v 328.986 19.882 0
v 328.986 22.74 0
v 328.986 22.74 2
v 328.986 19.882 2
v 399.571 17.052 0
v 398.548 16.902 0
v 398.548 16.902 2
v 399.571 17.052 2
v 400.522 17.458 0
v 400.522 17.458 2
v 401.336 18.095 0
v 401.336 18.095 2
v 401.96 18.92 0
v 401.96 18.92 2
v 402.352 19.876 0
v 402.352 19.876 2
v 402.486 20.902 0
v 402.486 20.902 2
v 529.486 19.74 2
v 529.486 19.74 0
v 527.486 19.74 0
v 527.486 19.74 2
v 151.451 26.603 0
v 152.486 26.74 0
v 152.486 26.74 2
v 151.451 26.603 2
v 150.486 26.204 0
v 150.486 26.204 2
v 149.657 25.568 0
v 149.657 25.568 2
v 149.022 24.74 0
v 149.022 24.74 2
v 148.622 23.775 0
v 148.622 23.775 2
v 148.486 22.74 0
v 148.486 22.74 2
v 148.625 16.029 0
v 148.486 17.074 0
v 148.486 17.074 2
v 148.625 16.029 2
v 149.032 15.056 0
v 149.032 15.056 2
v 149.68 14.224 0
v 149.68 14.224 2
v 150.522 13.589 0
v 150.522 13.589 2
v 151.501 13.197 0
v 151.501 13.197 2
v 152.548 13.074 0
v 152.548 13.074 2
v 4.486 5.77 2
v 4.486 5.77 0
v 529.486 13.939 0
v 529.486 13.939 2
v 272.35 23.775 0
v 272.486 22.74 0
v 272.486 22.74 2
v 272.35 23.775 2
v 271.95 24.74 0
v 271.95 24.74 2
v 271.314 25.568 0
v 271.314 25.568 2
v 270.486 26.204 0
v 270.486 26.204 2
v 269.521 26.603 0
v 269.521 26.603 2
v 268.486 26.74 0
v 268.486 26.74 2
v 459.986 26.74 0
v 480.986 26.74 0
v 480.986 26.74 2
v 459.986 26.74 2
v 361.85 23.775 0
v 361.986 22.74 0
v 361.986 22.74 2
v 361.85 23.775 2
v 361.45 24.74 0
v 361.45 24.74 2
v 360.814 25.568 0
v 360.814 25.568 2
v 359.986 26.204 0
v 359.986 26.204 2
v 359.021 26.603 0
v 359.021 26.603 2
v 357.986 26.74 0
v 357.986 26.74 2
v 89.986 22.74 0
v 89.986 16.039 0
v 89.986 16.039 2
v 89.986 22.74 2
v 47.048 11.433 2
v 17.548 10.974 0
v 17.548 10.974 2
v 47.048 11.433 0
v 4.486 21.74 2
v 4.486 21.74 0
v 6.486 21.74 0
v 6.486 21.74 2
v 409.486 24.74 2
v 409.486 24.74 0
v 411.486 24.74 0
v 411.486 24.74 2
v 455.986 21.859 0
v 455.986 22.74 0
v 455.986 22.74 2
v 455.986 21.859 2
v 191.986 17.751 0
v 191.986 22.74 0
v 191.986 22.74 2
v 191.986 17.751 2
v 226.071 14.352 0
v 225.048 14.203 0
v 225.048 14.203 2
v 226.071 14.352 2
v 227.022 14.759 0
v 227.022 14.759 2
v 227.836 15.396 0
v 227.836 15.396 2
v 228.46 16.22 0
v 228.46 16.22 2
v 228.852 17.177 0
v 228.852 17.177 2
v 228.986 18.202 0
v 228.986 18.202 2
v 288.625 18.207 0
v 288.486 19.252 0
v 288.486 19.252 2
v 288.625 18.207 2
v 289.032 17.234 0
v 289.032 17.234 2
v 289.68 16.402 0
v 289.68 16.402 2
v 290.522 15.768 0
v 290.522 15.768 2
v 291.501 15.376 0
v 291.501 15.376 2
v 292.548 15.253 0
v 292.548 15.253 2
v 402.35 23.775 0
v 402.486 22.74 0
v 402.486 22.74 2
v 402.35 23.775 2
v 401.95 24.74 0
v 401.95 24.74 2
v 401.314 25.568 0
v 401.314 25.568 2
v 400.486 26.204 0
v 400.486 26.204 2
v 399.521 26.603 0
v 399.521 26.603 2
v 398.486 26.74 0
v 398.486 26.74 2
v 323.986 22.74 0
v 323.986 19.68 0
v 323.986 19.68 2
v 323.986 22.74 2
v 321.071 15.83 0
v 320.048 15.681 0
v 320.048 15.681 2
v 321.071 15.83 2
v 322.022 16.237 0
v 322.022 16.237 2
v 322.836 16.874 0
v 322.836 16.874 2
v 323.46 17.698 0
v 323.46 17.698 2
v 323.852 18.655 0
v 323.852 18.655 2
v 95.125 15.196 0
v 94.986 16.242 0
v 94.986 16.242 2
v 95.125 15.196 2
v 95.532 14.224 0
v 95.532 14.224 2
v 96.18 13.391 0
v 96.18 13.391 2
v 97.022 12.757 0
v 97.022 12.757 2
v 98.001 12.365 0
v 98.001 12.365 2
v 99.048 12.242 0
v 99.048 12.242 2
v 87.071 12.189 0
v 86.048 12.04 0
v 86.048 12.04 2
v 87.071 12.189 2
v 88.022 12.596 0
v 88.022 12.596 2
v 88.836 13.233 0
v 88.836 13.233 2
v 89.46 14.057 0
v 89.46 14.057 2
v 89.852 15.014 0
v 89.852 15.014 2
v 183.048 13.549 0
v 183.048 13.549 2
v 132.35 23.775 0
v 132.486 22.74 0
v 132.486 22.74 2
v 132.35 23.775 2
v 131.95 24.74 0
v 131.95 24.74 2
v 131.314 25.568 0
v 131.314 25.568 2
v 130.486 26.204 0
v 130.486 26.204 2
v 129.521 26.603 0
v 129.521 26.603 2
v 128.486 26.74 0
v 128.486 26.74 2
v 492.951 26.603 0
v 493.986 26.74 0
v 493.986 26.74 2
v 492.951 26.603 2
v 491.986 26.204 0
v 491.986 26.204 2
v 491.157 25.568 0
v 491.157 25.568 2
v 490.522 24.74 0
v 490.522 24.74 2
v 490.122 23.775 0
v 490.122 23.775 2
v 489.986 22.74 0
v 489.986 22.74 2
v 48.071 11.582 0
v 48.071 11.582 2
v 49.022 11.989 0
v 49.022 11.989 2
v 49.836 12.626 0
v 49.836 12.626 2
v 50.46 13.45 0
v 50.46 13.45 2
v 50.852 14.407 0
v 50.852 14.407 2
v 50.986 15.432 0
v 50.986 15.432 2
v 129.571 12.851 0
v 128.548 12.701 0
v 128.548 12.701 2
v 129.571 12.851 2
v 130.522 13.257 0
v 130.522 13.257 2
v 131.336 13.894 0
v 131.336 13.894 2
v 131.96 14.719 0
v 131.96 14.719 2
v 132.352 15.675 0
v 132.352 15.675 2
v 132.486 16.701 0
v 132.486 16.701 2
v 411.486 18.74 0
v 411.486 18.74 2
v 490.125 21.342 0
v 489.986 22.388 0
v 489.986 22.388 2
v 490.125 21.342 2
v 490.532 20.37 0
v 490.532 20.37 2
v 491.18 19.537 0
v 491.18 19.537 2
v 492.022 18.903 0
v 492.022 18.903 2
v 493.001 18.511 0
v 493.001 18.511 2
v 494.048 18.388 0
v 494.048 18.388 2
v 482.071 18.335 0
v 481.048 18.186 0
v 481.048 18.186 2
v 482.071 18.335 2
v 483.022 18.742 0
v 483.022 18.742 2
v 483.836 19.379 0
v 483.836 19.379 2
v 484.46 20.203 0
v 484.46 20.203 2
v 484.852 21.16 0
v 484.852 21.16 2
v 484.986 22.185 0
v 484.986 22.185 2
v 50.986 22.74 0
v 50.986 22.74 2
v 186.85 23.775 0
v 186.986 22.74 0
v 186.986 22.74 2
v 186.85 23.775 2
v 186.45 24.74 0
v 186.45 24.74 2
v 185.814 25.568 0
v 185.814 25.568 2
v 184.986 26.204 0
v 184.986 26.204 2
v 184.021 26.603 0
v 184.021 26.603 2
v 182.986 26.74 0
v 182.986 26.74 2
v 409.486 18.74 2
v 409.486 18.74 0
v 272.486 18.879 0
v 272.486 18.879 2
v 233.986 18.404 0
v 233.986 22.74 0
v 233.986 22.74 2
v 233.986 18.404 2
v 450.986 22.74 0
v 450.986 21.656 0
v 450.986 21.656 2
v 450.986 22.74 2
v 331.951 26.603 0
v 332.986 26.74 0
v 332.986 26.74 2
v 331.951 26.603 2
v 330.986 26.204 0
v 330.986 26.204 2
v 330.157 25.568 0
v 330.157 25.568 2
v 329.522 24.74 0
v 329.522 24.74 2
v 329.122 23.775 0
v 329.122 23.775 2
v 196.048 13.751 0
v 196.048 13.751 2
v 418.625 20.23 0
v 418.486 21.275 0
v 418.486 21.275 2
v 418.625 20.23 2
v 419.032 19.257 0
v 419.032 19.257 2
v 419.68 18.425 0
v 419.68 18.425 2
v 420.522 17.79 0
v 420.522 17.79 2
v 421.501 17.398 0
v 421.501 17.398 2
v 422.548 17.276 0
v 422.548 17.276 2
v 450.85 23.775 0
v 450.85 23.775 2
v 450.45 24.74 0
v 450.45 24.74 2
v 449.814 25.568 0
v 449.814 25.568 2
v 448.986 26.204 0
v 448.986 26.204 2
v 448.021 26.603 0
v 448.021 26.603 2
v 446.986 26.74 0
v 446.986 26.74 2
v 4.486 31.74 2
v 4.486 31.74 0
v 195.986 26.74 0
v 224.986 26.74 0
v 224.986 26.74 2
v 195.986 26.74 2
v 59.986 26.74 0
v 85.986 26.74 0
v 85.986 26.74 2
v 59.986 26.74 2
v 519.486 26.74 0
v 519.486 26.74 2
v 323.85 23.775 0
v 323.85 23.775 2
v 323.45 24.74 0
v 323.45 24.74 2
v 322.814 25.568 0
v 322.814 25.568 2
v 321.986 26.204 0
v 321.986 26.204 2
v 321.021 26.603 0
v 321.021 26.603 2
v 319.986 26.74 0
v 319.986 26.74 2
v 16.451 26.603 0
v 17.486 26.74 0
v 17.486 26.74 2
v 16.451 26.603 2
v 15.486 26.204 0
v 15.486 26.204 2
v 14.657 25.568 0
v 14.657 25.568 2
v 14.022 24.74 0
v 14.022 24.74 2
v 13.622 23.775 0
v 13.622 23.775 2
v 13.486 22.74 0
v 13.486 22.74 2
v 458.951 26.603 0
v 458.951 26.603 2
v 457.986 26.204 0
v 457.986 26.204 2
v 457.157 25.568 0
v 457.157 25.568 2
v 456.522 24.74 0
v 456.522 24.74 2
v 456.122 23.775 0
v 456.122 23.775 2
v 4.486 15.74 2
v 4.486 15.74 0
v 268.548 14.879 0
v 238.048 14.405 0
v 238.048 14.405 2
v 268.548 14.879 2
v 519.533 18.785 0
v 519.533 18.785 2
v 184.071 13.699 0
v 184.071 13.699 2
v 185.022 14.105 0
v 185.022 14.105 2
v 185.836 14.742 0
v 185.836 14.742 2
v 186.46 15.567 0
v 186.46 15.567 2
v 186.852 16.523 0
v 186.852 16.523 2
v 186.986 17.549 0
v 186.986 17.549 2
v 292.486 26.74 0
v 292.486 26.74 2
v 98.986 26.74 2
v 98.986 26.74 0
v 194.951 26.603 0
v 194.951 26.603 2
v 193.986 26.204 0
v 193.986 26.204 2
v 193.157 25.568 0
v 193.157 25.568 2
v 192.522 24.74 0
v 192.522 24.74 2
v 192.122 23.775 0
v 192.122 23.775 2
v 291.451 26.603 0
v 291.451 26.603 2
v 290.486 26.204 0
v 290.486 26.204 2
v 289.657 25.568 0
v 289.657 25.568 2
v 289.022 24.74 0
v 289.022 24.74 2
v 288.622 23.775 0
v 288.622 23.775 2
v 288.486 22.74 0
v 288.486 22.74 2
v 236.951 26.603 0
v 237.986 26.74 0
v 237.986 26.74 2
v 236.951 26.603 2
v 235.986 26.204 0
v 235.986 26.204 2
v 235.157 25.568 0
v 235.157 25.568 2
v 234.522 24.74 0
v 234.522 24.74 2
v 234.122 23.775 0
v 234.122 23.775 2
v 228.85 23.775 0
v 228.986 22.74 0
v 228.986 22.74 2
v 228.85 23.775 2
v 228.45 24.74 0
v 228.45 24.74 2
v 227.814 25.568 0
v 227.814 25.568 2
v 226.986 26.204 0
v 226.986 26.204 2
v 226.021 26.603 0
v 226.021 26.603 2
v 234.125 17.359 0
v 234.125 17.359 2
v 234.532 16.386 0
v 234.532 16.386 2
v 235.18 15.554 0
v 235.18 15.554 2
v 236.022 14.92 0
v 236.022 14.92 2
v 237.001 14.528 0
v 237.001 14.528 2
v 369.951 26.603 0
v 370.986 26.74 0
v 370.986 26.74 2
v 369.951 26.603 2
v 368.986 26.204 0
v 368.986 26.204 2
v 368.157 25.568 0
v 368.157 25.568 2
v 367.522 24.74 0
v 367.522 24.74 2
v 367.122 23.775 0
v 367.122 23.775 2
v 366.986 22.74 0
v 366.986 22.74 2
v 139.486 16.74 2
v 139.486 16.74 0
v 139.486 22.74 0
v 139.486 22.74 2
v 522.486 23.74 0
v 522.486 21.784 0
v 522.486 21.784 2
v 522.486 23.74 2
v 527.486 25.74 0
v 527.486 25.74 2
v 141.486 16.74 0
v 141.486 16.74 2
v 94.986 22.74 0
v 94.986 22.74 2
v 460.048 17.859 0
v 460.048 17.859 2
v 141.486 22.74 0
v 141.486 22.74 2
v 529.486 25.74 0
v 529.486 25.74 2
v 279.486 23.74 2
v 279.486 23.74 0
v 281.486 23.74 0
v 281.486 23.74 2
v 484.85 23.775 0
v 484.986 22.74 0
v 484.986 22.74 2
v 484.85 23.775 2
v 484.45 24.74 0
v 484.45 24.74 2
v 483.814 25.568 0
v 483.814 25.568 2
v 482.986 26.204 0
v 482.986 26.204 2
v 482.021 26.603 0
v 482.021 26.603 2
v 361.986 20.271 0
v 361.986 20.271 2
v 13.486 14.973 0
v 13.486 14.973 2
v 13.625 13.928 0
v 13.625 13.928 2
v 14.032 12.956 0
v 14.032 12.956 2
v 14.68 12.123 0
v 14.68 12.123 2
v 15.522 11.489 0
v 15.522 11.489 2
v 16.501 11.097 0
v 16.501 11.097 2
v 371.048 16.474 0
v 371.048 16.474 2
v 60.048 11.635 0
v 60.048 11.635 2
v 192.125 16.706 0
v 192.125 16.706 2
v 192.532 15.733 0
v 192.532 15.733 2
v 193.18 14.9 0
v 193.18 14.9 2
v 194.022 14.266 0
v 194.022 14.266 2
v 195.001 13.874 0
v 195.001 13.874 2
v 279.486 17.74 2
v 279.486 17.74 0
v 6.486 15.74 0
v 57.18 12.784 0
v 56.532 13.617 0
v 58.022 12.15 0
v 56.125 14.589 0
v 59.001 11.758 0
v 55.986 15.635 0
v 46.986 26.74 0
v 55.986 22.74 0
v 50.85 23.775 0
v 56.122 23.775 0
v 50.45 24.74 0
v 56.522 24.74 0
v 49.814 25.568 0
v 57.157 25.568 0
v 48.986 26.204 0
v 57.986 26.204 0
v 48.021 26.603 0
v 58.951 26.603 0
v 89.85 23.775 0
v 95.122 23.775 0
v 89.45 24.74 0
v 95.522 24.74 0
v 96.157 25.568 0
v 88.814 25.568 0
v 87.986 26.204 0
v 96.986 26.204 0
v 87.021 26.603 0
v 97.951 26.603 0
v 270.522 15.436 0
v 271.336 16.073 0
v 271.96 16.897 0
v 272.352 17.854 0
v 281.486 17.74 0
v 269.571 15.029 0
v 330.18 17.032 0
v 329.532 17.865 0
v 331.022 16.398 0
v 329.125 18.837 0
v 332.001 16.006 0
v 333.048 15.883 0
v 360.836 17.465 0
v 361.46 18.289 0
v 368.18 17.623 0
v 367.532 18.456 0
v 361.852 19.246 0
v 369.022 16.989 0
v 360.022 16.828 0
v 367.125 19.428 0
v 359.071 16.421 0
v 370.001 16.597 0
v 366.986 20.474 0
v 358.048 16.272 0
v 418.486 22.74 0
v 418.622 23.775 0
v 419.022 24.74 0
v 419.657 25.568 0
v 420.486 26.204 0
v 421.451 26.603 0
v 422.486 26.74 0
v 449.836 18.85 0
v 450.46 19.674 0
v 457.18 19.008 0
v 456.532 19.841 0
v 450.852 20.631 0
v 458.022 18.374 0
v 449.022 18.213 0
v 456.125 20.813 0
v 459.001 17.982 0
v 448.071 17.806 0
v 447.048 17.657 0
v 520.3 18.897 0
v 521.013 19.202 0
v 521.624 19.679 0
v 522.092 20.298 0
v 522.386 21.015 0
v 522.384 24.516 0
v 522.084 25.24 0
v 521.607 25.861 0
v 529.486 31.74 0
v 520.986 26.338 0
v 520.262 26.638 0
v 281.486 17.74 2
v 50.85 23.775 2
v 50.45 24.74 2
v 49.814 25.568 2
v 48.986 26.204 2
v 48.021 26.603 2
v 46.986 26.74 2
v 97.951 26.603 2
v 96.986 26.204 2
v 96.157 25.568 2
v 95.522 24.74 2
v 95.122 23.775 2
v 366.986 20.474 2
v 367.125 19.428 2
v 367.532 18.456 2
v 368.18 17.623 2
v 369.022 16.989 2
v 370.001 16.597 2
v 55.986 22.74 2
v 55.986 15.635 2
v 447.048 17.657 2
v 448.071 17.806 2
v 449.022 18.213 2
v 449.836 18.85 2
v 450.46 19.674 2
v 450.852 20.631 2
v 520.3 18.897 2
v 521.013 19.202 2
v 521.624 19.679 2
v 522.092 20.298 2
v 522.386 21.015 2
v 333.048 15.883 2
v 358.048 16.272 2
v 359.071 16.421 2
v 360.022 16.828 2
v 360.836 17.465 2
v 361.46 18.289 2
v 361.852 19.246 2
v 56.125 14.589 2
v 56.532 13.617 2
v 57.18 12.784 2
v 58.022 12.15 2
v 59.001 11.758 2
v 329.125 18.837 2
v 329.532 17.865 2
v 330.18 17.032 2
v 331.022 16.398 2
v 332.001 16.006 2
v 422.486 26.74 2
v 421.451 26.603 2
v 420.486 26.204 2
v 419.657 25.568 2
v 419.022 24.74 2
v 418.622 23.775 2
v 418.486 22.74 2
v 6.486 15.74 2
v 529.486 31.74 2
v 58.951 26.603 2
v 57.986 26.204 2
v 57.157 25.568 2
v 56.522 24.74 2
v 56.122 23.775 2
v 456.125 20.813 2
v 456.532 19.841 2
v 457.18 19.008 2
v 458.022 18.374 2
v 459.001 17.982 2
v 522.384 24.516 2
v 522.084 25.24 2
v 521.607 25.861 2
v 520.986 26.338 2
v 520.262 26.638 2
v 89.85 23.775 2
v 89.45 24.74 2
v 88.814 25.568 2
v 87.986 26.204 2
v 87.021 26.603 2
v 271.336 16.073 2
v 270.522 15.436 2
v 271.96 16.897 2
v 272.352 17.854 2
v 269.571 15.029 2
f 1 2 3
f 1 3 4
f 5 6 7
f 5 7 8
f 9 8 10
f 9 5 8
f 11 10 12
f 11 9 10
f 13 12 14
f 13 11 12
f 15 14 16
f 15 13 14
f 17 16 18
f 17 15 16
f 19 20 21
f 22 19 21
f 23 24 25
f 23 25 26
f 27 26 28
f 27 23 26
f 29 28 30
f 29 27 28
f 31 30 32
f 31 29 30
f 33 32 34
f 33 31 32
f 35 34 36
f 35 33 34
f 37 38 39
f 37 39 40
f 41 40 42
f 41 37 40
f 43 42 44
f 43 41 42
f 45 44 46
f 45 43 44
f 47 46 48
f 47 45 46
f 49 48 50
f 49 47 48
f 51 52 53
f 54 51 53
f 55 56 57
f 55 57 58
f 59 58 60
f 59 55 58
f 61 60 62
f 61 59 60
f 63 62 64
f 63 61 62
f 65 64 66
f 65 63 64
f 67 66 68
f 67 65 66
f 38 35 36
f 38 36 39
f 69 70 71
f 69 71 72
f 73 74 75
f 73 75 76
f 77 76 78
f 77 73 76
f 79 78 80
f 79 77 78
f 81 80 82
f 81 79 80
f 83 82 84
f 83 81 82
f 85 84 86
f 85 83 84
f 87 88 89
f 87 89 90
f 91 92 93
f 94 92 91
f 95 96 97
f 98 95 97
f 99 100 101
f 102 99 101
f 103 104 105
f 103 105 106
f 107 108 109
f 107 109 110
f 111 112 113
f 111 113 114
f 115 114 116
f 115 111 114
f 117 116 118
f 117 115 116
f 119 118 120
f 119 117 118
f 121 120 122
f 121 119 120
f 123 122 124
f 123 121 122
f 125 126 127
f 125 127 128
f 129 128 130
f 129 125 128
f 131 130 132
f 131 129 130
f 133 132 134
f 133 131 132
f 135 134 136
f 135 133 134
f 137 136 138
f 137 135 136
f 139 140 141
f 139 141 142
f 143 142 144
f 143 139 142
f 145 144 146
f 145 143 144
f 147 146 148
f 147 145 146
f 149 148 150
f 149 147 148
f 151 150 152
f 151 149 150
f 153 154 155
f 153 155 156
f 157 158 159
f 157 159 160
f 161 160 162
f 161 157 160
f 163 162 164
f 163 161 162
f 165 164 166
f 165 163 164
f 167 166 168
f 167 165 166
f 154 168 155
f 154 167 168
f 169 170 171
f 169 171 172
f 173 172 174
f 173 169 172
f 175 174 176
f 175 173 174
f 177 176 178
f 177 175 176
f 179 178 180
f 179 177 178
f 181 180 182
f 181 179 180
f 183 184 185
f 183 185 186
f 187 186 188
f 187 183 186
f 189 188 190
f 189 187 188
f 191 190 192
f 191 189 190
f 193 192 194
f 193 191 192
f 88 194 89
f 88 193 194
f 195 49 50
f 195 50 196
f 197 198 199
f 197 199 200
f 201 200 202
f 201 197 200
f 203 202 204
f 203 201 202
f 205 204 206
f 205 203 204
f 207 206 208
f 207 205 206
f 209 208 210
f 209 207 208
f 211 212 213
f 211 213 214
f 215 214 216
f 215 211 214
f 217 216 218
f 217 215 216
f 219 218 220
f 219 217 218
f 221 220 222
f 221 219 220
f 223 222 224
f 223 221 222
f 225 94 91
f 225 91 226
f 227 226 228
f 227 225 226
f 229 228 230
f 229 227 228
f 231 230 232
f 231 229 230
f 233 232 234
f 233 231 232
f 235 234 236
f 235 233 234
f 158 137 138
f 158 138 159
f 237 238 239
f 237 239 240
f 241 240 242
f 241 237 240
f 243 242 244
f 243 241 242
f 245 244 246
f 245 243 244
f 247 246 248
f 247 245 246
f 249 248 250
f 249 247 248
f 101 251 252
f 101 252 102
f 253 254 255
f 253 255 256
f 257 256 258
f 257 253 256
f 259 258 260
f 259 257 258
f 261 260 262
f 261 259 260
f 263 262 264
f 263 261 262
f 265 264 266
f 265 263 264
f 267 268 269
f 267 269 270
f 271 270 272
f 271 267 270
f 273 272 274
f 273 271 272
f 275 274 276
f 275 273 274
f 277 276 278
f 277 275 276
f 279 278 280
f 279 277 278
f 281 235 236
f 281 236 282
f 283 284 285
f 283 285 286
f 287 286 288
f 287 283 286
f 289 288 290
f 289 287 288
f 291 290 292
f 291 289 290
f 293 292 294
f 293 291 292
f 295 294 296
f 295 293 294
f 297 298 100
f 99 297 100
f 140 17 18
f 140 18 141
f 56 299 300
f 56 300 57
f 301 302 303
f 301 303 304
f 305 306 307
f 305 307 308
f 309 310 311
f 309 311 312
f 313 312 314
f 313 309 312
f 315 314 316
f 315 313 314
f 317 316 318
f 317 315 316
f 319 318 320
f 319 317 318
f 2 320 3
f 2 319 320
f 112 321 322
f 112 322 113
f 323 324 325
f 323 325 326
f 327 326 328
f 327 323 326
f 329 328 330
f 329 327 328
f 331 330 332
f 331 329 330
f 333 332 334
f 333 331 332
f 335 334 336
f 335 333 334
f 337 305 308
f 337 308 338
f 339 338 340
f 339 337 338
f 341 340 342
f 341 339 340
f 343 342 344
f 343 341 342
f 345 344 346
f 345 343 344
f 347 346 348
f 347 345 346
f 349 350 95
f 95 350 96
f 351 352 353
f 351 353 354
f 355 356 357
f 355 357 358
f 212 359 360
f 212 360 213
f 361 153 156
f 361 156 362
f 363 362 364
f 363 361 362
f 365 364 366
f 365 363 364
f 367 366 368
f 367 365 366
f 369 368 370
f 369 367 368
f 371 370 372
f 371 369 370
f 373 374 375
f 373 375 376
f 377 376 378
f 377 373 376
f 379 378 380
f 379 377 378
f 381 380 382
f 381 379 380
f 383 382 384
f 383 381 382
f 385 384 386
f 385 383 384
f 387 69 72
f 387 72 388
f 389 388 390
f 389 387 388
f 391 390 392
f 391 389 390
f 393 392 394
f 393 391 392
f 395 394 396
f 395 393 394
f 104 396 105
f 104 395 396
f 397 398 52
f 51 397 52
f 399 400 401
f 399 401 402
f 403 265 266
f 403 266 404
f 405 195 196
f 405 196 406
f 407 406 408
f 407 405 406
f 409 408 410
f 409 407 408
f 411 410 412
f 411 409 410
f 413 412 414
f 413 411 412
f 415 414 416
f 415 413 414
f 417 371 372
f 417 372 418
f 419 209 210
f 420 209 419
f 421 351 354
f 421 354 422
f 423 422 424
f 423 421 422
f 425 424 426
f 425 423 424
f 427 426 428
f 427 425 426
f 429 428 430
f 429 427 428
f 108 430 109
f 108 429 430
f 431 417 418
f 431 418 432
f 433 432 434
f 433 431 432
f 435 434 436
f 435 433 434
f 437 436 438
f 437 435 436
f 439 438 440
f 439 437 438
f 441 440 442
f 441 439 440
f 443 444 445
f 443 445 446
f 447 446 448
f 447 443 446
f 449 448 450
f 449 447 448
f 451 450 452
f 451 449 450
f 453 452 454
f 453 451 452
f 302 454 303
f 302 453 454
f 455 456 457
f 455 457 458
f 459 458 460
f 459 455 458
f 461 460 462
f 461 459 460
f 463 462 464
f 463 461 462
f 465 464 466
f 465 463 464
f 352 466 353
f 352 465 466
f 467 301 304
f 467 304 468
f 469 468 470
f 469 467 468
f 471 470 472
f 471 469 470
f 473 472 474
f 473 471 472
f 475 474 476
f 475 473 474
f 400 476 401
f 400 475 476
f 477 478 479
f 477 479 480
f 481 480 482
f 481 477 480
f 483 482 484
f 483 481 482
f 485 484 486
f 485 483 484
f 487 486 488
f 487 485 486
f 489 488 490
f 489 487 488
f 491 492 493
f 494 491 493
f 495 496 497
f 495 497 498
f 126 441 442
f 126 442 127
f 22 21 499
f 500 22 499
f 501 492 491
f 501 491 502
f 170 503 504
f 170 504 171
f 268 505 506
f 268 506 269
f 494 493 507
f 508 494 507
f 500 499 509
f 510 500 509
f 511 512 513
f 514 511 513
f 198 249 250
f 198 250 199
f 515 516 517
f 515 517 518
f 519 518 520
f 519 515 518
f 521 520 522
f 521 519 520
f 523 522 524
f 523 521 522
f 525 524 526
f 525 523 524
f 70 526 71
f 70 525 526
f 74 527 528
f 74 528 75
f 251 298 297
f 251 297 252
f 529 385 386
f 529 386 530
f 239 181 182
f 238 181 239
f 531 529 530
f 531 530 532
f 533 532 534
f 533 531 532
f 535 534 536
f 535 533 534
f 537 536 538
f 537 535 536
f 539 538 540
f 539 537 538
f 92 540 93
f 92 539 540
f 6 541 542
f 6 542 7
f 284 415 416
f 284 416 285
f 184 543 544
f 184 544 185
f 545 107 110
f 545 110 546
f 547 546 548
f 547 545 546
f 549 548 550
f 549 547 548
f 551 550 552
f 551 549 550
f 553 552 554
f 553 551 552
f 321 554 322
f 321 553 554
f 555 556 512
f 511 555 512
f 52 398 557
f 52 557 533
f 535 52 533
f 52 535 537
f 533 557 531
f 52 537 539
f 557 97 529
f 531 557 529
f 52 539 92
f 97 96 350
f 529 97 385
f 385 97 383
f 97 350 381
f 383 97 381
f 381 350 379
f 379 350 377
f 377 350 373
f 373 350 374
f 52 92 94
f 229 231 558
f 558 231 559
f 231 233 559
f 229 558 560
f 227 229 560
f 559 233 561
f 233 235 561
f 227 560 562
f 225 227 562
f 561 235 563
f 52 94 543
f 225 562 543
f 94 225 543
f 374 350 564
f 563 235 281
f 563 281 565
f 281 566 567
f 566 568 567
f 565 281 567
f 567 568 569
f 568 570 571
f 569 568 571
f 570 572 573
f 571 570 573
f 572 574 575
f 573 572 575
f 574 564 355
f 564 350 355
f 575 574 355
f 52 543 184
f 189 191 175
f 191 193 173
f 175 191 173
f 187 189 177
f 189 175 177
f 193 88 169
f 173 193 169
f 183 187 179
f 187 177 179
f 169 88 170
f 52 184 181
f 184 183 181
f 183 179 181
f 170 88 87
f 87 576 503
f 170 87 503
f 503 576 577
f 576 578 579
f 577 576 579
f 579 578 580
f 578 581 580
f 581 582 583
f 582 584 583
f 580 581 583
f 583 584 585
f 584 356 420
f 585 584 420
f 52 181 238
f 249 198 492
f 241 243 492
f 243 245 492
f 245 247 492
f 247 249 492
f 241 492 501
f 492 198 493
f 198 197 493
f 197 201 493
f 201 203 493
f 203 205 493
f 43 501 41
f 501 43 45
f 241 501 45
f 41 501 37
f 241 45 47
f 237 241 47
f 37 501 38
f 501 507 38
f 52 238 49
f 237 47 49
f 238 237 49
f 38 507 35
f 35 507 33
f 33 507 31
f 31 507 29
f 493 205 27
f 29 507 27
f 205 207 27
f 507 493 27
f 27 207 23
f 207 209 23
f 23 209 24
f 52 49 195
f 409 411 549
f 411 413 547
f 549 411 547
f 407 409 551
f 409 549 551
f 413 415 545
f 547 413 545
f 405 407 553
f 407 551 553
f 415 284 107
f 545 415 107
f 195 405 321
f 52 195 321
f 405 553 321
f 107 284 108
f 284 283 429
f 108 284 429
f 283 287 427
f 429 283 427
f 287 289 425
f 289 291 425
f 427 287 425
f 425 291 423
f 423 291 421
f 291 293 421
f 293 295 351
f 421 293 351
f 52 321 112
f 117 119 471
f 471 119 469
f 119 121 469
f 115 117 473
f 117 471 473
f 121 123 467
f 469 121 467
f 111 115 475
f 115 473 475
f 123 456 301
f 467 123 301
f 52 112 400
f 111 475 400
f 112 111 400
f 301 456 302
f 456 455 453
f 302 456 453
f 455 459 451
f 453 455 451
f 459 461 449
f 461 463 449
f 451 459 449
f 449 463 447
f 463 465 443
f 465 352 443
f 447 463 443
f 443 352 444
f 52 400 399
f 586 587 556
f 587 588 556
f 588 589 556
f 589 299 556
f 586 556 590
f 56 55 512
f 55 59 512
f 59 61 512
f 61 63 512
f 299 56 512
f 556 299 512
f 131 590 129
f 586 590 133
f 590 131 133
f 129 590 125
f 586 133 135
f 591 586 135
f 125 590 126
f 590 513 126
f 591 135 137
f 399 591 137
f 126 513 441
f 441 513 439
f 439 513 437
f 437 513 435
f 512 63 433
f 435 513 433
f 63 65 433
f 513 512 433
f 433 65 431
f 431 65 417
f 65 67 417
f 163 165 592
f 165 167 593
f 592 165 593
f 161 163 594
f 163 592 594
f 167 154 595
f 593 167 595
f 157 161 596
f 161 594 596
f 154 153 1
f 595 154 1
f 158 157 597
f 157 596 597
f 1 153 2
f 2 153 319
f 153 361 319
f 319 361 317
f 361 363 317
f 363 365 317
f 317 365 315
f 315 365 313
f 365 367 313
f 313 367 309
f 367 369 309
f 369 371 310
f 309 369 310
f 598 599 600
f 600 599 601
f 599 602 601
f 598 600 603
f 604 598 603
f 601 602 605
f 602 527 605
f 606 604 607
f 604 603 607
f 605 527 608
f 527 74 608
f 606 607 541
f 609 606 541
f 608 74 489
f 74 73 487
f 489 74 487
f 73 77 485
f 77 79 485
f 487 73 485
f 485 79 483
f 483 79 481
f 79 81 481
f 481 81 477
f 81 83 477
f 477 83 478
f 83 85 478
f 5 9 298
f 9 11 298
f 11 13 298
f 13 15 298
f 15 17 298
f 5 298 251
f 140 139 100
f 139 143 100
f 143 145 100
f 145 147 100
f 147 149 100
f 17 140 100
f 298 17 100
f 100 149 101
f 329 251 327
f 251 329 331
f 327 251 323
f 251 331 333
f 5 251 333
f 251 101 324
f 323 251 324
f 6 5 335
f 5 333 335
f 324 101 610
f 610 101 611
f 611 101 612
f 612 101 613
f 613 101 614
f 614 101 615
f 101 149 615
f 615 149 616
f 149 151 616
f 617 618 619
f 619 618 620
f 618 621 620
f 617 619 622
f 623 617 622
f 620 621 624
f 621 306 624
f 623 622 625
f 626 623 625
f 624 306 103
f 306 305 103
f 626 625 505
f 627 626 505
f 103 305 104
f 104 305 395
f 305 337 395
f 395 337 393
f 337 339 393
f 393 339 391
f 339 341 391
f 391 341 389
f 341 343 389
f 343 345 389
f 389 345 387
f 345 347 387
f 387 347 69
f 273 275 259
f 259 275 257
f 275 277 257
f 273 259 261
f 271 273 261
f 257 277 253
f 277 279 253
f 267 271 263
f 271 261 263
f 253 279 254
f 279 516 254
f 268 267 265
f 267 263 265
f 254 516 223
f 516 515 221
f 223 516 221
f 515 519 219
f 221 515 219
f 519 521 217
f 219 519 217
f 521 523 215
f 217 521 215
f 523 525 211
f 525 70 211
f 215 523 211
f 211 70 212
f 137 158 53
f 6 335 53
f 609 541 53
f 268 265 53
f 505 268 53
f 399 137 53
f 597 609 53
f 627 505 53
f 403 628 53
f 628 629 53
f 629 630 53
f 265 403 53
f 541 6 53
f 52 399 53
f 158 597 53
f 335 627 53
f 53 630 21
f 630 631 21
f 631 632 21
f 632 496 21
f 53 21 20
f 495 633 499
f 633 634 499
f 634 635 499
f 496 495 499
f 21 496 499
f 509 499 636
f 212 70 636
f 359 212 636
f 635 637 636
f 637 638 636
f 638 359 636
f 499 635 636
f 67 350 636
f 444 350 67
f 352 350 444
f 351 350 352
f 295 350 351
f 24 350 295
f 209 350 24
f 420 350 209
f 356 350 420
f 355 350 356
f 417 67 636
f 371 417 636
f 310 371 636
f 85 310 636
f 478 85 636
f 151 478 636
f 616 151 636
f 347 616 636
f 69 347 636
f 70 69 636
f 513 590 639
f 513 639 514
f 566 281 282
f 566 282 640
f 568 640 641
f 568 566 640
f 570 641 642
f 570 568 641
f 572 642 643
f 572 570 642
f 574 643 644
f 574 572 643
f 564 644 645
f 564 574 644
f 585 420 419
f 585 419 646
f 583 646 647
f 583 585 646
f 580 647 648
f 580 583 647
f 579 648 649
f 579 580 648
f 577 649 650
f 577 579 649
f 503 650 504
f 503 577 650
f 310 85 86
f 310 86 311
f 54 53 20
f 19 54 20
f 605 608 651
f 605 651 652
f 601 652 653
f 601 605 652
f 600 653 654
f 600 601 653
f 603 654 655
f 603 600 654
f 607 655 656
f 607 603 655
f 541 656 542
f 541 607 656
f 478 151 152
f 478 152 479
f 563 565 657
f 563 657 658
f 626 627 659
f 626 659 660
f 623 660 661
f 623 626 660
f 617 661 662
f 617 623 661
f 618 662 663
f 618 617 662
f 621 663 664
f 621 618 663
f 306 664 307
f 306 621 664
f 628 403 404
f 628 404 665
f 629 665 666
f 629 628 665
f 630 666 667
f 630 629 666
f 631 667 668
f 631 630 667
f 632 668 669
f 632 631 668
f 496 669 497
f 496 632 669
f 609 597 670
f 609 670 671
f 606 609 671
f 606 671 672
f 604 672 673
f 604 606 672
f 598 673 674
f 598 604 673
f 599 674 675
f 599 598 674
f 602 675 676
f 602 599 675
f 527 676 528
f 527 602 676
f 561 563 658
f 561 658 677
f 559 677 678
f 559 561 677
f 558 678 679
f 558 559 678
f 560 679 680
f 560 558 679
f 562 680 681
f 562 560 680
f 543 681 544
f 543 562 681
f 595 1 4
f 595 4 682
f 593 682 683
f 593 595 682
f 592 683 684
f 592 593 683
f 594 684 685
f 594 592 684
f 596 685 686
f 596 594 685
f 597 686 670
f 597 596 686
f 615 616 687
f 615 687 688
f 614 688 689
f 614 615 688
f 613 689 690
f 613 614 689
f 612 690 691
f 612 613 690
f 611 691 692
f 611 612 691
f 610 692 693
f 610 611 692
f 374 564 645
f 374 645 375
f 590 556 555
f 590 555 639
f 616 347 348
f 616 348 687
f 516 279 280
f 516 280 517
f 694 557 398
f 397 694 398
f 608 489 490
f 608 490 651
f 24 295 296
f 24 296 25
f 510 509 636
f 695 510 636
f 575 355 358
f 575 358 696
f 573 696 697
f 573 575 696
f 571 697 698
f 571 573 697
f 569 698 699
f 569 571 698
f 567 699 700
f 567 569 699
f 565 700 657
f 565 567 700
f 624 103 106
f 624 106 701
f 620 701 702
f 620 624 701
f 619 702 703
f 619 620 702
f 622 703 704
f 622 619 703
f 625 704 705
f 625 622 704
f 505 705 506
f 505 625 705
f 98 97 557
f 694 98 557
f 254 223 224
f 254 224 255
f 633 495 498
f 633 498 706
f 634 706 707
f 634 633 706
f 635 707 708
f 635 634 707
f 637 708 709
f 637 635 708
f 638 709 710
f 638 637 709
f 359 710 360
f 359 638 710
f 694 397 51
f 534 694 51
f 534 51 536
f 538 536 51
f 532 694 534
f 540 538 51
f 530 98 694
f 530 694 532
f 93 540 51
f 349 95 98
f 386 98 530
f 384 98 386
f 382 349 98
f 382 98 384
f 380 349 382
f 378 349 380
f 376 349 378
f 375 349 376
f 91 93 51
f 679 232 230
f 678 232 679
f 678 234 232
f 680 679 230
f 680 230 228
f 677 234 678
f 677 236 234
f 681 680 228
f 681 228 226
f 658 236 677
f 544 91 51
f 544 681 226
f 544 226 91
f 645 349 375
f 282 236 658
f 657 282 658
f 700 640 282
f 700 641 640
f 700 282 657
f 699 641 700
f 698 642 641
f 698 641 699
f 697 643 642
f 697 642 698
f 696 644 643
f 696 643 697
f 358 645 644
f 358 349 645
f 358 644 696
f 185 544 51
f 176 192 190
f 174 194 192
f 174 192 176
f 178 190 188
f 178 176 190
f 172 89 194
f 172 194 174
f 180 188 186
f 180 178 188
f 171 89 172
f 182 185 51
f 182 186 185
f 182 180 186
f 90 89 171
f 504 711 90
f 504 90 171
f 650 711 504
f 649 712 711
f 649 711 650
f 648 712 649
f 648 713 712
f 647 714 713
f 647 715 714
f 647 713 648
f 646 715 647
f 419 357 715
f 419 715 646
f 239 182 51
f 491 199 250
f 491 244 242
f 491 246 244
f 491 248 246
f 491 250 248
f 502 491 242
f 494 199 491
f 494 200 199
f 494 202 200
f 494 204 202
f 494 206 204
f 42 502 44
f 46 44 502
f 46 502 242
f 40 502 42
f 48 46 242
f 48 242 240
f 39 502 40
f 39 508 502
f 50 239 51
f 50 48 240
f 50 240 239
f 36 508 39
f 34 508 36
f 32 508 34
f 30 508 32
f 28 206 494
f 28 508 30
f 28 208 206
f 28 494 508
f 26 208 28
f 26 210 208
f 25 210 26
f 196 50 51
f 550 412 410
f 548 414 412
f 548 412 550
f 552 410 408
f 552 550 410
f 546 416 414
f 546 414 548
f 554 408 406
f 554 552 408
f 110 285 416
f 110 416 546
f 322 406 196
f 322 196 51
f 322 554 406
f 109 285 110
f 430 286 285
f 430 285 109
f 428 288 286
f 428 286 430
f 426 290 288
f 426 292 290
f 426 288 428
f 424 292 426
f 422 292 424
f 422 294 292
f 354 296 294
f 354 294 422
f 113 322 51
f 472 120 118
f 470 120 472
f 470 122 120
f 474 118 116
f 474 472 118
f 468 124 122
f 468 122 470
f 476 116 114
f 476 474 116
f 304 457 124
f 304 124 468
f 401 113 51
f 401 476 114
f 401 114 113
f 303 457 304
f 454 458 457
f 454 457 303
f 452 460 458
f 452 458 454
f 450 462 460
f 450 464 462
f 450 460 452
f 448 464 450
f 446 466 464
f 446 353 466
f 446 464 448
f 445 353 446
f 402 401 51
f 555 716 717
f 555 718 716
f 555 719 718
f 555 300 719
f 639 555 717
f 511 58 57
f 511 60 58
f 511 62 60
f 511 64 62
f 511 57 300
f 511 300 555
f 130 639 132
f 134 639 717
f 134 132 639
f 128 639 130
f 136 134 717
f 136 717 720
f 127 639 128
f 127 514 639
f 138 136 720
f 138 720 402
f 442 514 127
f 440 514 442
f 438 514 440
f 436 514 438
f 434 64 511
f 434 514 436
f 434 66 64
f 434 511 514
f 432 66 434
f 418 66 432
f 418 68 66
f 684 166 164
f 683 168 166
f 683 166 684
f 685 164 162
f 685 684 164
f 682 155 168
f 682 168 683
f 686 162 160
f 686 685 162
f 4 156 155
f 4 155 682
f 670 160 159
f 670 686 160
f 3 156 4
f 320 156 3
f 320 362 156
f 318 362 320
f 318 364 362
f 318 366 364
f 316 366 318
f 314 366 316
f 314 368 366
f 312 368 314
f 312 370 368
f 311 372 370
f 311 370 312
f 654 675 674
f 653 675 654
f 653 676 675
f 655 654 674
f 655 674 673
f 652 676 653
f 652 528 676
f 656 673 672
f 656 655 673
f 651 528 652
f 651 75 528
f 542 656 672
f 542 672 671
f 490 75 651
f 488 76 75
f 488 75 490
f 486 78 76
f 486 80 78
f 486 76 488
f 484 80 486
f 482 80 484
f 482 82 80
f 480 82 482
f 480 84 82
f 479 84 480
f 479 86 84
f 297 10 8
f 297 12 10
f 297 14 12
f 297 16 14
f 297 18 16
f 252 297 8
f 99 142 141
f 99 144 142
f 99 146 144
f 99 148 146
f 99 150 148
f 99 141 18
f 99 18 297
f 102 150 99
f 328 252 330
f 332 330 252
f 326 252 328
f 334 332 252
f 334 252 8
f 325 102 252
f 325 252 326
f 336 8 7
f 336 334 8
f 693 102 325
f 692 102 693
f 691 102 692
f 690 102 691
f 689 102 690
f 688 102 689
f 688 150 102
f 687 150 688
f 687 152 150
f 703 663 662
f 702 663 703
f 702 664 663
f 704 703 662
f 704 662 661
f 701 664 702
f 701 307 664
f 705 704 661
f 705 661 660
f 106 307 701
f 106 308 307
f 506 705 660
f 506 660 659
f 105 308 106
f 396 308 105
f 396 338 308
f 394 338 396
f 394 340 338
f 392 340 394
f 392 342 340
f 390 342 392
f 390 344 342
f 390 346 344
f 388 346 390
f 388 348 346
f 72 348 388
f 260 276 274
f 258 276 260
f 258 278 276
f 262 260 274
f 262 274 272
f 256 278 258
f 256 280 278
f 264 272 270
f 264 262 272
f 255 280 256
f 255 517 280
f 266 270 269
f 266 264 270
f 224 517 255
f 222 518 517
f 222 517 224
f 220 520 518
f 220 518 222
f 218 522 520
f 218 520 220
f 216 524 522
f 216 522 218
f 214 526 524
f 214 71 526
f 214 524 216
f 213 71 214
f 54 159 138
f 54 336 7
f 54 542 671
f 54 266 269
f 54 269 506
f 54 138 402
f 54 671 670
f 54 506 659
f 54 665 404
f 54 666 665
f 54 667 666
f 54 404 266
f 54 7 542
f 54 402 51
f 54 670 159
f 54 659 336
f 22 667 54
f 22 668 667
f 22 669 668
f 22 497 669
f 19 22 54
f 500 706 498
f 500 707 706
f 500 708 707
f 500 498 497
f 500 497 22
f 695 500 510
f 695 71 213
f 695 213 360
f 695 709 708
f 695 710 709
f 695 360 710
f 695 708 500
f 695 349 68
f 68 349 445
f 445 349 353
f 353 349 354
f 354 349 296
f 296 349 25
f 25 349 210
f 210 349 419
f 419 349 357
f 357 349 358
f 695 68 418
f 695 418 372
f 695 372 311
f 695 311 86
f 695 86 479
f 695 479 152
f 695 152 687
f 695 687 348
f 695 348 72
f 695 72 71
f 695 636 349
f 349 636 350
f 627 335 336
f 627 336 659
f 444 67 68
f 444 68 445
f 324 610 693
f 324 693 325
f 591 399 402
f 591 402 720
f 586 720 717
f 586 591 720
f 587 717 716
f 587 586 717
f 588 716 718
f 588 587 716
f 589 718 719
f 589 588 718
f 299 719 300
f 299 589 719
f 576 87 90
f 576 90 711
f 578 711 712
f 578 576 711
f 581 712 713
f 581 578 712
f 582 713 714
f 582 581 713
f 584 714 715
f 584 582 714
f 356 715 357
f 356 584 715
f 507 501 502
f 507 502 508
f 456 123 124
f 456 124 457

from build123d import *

# Parameters (mm, degrees)
SKETCH_1_W      = 2
SKETCH_1_H      = 6
EXTRUDE_1_DEPTH = 2


with BuildPart() as part:
    # 草图1 → 凸台-拉伸1 (new body)
    with BuildSketch(Plane.XY):
        Polygon((529.48584496, 31.739769875), (4.48584496, 31.739769875), (4.48584496, 21.739769875), (6.48584496, 21.739769875), (6.48584496, 15.739769875), (4.48584496, 15.739769875), (4.48584496, 5.770075294), (529.48584496, 13.938813064), (529.48584496, 19.739769875), (527.48584496, 19.739769875), (527.48584496, 25.739769875), (529.48584496, 25.739769875), align=None)
        with Locations((140.48584496, 19.739769875)):
            Rectangle(SKETCH_1_W, SKETCH_1_H, mode=Mode.SUBTRACT)
        with Locations((280.48584496, 20.739769875)):
            Rectangle(SKETCH_1_W, SKETCH_1_H, mode=Mode.SUBTRACT)
        with Locations((410.48584496, 21.739769875)):
            Rectangle(SKETCH_1_W, SKETCH_1_H, mode=Mode.SUBTRACT)
        with BuildLine():
            Line((13.48584496, 22.739769875), (13.48584496, 14.973438176))
            ThreePointArc((13.48584496, 14.973438176), (14.679505875, 12.123094173), (17.54807543, 10.973922284))
            Line((17.54807543, 10.973922284), (47.04807543, 11.43292755))
            ThreePointArc((47.04807543, 11.43292755), (49.836188964, 12.626104356), (50.98584496, 15.432443441))
            Line((50.98584496, 15.432443441), (50.98584496, 22.739769875))
            ThreePointArc((50.98584496, 22.739769875), (49.814272085, 25.568196999), (46.98584496, 26.739769875))
            Line((46.98584496, 26.739769875), (17.48584496, 26.739769875))
            ThreePointArc((17.48584496, 26.739769875), (14.657417835, 25.568196999), (13.48584496, 22.739769875))
        make_face(mode=Mode.SUBTRACT)
        with BuildLine():
            Line((55.98584496, 22.739769875), (55.98584496, 15.634716948))
            ThreePointArc((55.98584496, 15.634716948), (57.179505875, 12.784372944), (60.04807543, 11.635201056))
            Line((60.04807543, 11.635201056), (86.04807543, 12.03974807))
            ThreePointArc((86.04807543, 12.03974807), (88.836188964, 13.232924876), (89.98584496, 16.039263961))
            Line((89.98584496, 16.039263961), (89.98584496, 22.739769875))
            ThreePointArc((89.98584496, 22.739769875), (88.814272085, 25.568196999), (85.98584496, 26.739769875))
            Line((85.98584496, 26.739769875), (59.98584496, 26.739769875))
            ThreePointArc((59.98584496, 26.739769875), (57.157417835, 25.568196999), (55.98584496, 22.739769875))
        make_face(mode=Mode.SUBTRACT)
        with BuildLine():
            Line((94.98584496, 22.739769875), (94.98584496, 16.241537468))
            ThreePointArc((94.98584496, 16.241537468), (96.179505875, 13.391193464), (99.04807543, 12.242021576))
            Line((99.04807543, 12.242021576), (128.54807543, 12.701026841))
            ThreePointArc((128.54807543, 12.701026841), (131.336188964, 13.894203648), (132.48584496, 16.700542733))
            Line((132.48584496, 16.700542733), (132.48584496, 22.739769875))
            ThreePointArc((132.48584496, 22.739769875), (131.314272085, 25.568196999), (128.48584496, 26.739769875))
            Line((128.48584496, 26.739769875), (98.98584496, 26.739769875))
            ThreePointArc((98.98584496, 26.739769875), (96.157417835, 25.568196999), (94.98584496, 22.739769875))
        make_face(mode=Mode.SUBTRACT)
        with BuildLine():
            Line((148.48584496, 22.739769875), (148.48584496, 17.073970745))
            ThreePointArc((148.48584496, 17.073970745), (149.679505875, 14.223626742), (152.54807543, 13.074454854))
            Line((152.54807543, 13.074454854), (183.04807543, 13.549019619))
            ThreePointArc((183.04807543, 13.549019619), (185.836188964, 14.742196426), (186.98584496, 17.548535511))
            Line((186.98584496, 17.548535511), (186.98584496, 22.739769875))
            ThreePointArc((186.98584496, 22.739769875), (185.814272085, 25.568196999), (182.98584496, 26.739769875))
            Line((182.98584496, 26.739769875), (152.48584496, 26.739769875))
            ThreePointArc((152.48584496, 26.739769875), (149.657417835, 25.568196999), (148.48584496, 22.739769875))
        make_face(mode=Mode.SUBTRACT)
        with BuildLine():
            Line((191.98584496, 22.739769875), (191.98584496, 17.750809018))
            ThreePointArc((191.98584496, 17.750809018), (193.179505875, 14.900465014), (196.04807543, 13.751293126))
            Line((196.04807543, 13.751293126), (225.04807543, 14.202518641))
            ThreePointArc((225.04807543, 14.202518641), (227.836188964, 15.395695448), (228.98584496, 18.202034533))
            Line((228.98584496, 18.202034533), (228.98584496, 22.739769875))
            ThreePointArc((228.98584496, 22.739769875), (227.814272085, 25.568196999), (224.98584496, 26.739769875))
            Line((224.98584496, 26.739769875), (195.98584496, 26.739769875))
            ThreePointArc((195.98584496, 26.739769875), (193.157417835, 25.568196999), (191.98584496, 22.739769875))
        make_face(mode=Mode.SUBTRACT)
        with BuildLine():
            Line((233.98584496, 22.739769875), (233.98584496, 18.404308039))
            ThreePointArc((233.98584496, 18.404308039), (235.179505875, 15.553964036), (238.04807543, 14.404792148))
            Line((238.04807543, 14.404792148), (268.54807543, 14.879356913))
            ThreePointArc((268.54807543, 14.879356913), (271.336188964, 16.07253372), (272.48584496, 18.878872805))
            Line((272.48584496, 18.878872805), (272.48584496, 22.739769875))
            ThreePointArc((272.48584496, 22.739769875), (271.314272085, 25.568196999), (268.48584496, 26.739769875))
            Line((268.48584496, 26.739769875), (237.98584496, 26.739769875))
            ThreePointArc((237.98584496, 26.739769875), (235.157417835, 25.568196999), (233.98584496, 22.739769875))
        make_face(mode=Mode.SUBTRACT)
        with BuildLine():
            Line((288.48584496, 22.739769875), (288.48584496, 19.252300817))
            ThreePointArc((288.48584496, 19.252300817), (289.679505875, 16.401956814), (292.54807543, 15.252784926))
            Line((292.54807543, 15.252784926), (320.04807543, 15.68067119))
            ThreePointArc((320.04807543, 15.68067119), (322.836188964, 16.873847996), (323.98584496, 19.680187081))
            Line((323.98584496, 19.680187081), (323.98584496, 22.739769875))
            ThreePointArc((323.98584496, 22.739769875), (322.814272085, 25.568196999), (319.98584496, 26.739769875))
            Line((319.98584496, 26.739769875), (292.48584496, 26.739769875))
            ThreePointArc((292.48584496, 26.739769875), (289.657417835, 25.568196999), (288.48584496, 22.739769875))
        make_face(mode=Mode.SUBTRACT)
        with BuildLine():
            Line((328.98584496, 22.739769875), (328.98584496, 19.882460588))
            ThreePointArc((328.98584496, 19.882460588), (330.179505875, 17.032116584), (333.04807543, 15.882944696))
            Line((333.04807543, 15.882944696), (358.04807543, 16.271932209))
            ThreePointArc((358.04807543, 16.271932209), (360.836188964, 17.465109016), (361.98584496, 20.271448101))
            Line((361.98584496, 20.271448101), (361.98584496, 22.739769875))
            ThreePointArc((361.98584496, 22.739769875), (360.814272085, 25.568196999), (357.98584496, 26.739769875))
            Line((357.98584496, 26.739769875), (332.98584496, 26.739769875))
            ThreePointArc((332.98584496, 26.739769875), (330.157417835, 25.568196999), (328.98584496, 22.739769875))
        make_face(mode=Mode.SUBTRACT)
        with BuildLine():
            Line((366.98584496, 22.739769875), (366.98584496, 20.473721608))
            ThreePointArc((366.98584496, 20.473721608), (368.179505875, 17.623377604), (371.04807543, 16.474205716))
            Line((371.04807543, 16.474205716), (398.54807543, 16.90209198))
            ThreePointArc((398.54807543, 16.90209198), (401.336188964, 18.095268787), (402.48584496, 20.901607872))
            Line((402.48584496, 20.901607872), (402.48584496, 22.739769875))
            ThreePointArc((402.48584496, 22.739769875), (401.314272085, 25.568196999), (398.48584496, 26.739769875))
            Line((398.48584496, 26.739769875), (370.98584496, 26.739769875))
            ThreePointArc((370.98584496, 26.739769875), (368.157417835, 25.568196999), (366.98584496, 22.739769875))
        make_face(mode=Mode.SUBTRACT)
        with BuildLine():
            Line((418.48584496, 22.739769875), (418.48584496, 21.275035884))
            ThreePointArc((418.48584496, 21.275035884), (419.679505875, 18.42469188), (422.54807543, 17.275519992))
            Line((422.54807543, 17.275519992), (447.04807543, 17.656727755))
            ThreePointArc((447.04807543, 17.656727755), (449.836188964, 18.849904561), (450.98584496, 21.656243647))
            Line((450.98584496, 21.656243647), (450.98584496, 22.739769875))
            ThreePointArc((450.98584496, 22.739769875), (449.814272085, 25.568196999), (446.98584496, 26.739769875))
            Line((446.98584496, 26.739769875), (422.48584496, 26.739769875))
            ThreePointArc((422.48584496, 26.739769875), (419.657417835, 25.568196999), (418.48584496, 22.739769875))
        make_face(mode=Mode.SUBTRACT)
        with BuildLine():
            Line((455.98584496, 22.739769875), (455.98584496, 21.858517153))
            ThreePointArc((455.98584496, 21.858517153), (457.179505875, 19.00817315), (460.04807543, 17.859001262))
            Line((460.04807543, 17.859001262), (481.04807543, 18.185750772))
            ThreePointArc((481.04807543, 18.185750772), (483.836188964, 19.378927579), (484.98584496, 22.185266664))
            Line((484.98584496, 22.185266664), (484.98584496, 22.739769875))
            ThreePointArc((484.98584496, 22.739769875), (483.814272085, 25.568196999), (480.98584496, 26.739769875))
            Line((480.98584496, 26.739769875), (459.98584496, 26.739769875))
            ThreePointArc((459.98584496, 26.739769875), (457.157417835, 25.568196999), (455.98584496, 22.739769875))
        make_face(mode=Mode.SUBTRACT)
        with BuildLine():
            Line((489.98584496, 22.739769875), (489.98584496, 22.387540171))
            ThreePointArc((489.98584496, 22.387540171), (491.179505875, 19.537196167), (494.04807543, 18.388024279))
            Line((494.04807543, 18.388024279), (519.532517812, 18.784549473))
            ThreePointArc((519.532517812, 18.784549473), (521.623602963, 19.679432078), (522.48584496, 21.784186392))
            Line((522.48584496, 21.784186392), (522.48584496, 23.739769875))
            ThreePointArc((522.48584496, 23.739769875), (521.607165304, 25.861090218), (519.48584496, 26.739769875))
            Line((519.48584496, 26.739769875), (493.98584496, 26.739769875))
            ThreePointArc((493.98584496, 26.739769875), (491.157417835, 25.568196999), (489.98584496, 22.739769875))
        make_face(mode=Mode.SUBTRACT)
    extrude(amount=EXTRUDE_1_DEPTH)


solid = part.part
